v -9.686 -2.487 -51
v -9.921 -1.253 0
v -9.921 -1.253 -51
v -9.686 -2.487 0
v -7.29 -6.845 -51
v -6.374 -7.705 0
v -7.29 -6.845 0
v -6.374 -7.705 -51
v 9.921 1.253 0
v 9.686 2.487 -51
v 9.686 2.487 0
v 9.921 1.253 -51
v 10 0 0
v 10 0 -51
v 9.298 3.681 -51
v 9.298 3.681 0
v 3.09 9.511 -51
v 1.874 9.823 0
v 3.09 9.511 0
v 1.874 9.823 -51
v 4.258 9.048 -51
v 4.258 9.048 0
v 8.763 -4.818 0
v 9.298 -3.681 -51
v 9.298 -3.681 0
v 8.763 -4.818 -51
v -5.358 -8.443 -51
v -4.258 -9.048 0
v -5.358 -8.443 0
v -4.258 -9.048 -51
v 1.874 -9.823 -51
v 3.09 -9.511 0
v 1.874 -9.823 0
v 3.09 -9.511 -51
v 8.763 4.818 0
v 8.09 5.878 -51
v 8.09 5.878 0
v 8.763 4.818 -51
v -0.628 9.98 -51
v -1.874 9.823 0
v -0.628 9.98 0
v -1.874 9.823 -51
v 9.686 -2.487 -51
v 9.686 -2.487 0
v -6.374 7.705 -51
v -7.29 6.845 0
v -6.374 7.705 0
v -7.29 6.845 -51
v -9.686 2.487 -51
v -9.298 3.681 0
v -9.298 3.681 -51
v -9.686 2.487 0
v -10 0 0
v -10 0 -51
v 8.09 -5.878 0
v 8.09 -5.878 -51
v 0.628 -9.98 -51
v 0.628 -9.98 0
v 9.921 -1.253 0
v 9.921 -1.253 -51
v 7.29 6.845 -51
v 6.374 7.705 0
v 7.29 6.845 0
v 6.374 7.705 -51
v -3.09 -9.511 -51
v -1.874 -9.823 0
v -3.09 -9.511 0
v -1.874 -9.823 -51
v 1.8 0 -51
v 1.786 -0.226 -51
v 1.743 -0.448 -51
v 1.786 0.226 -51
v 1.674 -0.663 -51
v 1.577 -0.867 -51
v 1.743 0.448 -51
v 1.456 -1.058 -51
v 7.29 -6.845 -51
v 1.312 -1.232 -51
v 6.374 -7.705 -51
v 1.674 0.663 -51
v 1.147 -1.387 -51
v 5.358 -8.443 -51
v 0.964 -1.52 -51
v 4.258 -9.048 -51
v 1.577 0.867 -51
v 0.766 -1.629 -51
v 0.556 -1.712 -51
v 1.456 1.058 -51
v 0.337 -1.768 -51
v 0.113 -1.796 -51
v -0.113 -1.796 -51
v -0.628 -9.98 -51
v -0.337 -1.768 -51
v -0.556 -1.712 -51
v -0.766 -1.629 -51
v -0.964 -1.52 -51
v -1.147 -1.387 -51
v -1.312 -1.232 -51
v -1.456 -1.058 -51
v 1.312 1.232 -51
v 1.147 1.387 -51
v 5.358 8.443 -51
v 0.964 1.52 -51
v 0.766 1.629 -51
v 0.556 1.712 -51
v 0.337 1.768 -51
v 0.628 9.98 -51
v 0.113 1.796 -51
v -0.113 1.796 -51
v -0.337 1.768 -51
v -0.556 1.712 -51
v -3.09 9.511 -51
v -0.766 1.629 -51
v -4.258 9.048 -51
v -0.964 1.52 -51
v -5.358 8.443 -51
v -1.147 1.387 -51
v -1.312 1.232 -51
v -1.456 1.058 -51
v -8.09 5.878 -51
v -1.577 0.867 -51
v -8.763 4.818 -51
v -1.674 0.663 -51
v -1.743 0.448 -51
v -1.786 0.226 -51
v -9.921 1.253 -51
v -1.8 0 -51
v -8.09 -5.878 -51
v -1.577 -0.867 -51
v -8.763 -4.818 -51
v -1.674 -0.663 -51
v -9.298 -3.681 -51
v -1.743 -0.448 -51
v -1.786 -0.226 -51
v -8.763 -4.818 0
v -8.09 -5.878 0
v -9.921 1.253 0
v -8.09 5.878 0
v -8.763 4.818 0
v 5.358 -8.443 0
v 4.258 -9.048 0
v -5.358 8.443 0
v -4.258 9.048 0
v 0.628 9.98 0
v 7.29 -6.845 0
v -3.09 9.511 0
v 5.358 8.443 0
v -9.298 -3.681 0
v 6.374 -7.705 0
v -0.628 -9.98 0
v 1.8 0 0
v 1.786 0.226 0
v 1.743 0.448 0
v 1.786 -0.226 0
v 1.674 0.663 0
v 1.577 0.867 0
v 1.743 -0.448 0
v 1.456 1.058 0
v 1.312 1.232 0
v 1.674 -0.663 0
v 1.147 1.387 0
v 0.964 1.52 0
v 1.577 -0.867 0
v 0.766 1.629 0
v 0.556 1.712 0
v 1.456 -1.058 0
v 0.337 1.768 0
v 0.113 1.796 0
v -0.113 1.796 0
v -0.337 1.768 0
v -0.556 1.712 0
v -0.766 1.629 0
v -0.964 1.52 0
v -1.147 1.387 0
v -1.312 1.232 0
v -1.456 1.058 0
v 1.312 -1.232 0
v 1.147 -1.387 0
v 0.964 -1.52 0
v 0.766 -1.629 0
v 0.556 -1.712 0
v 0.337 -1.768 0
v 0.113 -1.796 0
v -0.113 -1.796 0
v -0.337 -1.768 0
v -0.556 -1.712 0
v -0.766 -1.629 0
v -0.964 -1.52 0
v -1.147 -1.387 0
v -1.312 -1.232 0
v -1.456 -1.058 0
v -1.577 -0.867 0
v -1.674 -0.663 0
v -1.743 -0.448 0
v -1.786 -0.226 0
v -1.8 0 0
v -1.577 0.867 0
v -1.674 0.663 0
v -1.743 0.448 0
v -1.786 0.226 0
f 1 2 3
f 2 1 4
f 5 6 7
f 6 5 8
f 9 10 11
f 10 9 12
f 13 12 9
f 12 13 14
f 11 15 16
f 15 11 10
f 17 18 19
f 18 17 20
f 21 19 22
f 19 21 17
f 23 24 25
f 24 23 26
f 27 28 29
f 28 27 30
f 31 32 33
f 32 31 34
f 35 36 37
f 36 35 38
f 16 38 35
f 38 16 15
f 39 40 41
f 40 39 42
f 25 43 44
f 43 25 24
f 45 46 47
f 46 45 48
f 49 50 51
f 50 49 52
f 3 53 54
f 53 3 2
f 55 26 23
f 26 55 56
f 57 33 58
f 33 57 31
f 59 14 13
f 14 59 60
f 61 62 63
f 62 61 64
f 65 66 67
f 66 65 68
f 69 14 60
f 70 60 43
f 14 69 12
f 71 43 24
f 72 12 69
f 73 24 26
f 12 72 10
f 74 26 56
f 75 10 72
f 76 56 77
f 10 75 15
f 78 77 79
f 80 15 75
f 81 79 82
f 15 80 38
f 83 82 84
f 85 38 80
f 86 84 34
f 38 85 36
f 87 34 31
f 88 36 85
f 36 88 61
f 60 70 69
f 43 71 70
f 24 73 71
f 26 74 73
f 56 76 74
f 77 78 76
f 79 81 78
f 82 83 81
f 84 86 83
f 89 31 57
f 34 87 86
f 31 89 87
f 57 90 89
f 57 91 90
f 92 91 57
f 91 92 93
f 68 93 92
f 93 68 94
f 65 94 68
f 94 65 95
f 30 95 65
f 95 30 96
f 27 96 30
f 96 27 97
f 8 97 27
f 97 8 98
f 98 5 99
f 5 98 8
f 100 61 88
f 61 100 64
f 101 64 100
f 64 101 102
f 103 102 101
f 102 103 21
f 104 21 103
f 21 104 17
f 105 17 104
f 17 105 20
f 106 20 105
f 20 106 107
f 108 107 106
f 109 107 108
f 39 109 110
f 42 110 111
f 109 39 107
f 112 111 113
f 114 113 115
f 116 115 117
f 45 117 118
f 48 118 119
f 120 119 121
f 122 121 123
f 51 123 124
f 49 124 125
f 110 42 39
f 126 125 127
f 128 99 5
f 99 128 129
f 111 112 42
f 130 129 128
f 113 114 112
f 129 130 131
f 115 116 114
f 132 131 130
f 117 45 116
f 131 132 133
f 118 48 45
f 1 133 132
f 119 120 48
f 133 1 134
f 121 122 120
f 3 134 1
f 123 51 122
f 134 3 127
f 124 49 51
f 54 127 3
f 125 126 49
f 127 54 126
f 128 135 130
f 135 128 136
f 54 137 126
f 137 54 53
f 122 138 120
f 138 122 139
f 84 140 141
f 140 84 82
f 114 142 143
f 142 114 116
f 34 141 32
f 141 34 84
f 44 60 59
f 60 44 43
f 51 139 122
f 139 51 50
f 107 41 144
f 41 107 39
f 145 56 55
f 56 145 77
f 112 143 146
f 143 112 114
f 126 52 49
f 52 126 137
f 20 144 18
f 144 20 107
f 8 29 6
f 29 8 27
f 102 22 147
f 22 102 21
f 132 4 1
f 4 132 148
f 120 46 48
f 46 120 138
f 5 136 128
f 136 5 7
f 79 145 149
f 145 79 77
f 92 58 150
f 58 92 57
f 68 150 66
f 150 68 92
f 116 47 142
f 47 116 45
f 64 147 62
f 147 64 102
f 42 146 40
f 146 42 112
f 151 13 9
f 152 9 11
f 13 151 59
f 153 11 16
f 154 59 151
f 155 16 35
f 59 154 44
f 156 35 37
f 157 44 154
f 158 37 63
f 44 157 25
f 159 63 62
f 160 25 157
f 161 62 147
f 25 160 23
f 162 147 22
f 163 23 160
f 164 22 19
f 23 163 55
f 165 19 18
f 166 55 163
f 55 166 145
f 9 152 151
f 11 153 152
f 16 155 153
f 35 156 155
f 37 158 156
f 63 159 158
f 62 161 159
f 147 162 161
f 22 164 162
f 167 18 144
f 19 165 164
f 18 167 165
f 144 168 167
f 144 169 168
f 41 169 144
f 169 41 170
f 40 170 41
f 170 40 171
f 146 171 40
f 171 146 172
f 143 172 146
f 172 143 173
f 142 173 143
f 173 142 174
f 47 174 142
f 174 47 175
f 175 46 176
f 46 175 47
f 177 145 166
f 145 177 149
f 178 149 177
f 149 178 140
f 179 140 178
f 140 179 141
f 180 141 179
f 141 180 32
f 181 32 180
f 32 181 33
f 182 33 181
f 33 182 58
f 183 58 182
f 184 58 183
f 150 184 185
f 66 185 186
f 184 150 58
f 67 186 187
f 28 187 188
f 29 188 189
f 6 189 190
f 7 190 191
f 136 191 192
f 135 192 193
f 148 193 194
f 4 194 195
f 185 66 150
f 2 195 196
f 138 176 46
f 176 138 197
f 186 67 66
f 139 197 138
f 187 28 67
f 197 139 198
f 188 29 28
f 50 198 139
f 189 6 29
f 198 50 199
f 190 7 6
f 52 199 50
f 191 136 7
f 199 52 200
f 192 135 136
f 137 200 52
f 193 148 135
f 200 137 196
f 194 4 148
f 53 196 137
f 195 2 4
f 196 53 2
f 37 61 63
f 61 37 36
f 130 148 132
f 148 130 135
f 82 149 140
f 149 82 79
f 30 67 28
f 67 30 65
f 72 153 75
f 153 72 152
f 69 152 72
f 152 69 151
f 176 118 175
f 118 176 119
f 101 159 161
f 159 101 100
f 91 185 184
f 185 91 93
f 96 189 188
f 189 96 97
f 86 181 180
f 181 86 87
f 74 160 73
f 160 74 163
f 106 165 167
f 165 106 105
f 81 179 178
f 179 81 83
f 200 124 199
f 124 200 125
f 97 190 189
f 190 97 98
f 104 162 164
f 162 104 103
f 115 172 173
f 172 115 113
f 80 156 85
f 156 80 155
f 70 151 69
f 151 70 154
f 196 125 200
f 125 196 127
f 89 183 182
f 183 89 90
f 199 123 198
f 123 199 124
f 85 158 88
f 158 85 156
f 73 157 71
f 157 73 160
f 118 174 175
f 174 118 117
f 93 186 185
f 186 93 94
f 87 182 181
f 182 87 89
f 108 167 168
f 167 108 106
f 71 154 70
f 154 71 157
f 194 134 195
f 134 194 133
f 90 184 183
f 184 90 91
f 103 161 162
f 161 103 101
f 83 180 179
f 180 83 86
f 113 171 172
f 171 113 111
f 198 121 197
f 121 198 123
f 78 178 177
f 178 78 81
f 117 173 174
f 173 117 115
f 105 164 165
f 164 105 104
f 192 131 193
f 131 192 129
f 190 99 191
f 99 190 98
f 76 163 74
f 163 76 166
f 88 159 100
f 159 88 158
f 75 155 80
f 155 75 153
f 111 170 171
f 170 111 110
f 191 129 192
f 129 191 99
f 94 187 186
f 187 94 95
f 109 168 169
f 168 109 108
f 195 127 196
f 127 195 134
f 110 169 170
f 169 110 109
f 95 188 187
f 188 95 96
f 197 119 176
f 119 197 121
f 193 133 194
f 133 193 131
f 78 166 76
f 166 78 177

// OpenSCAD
$fn = 50;


difference() {
	union() {
		translate(v = [0, 0, -51.0000000000]) {
			cylinder(h = 51, r = 10.0000000000);
		}
		cylinder(h = 0, r = 20.0000000000);
	}
	union() {
		#translate(v = [0, 0, -51]) {
			cylinder(h = 51, r = 1.8000000000);
		}
	}
}
